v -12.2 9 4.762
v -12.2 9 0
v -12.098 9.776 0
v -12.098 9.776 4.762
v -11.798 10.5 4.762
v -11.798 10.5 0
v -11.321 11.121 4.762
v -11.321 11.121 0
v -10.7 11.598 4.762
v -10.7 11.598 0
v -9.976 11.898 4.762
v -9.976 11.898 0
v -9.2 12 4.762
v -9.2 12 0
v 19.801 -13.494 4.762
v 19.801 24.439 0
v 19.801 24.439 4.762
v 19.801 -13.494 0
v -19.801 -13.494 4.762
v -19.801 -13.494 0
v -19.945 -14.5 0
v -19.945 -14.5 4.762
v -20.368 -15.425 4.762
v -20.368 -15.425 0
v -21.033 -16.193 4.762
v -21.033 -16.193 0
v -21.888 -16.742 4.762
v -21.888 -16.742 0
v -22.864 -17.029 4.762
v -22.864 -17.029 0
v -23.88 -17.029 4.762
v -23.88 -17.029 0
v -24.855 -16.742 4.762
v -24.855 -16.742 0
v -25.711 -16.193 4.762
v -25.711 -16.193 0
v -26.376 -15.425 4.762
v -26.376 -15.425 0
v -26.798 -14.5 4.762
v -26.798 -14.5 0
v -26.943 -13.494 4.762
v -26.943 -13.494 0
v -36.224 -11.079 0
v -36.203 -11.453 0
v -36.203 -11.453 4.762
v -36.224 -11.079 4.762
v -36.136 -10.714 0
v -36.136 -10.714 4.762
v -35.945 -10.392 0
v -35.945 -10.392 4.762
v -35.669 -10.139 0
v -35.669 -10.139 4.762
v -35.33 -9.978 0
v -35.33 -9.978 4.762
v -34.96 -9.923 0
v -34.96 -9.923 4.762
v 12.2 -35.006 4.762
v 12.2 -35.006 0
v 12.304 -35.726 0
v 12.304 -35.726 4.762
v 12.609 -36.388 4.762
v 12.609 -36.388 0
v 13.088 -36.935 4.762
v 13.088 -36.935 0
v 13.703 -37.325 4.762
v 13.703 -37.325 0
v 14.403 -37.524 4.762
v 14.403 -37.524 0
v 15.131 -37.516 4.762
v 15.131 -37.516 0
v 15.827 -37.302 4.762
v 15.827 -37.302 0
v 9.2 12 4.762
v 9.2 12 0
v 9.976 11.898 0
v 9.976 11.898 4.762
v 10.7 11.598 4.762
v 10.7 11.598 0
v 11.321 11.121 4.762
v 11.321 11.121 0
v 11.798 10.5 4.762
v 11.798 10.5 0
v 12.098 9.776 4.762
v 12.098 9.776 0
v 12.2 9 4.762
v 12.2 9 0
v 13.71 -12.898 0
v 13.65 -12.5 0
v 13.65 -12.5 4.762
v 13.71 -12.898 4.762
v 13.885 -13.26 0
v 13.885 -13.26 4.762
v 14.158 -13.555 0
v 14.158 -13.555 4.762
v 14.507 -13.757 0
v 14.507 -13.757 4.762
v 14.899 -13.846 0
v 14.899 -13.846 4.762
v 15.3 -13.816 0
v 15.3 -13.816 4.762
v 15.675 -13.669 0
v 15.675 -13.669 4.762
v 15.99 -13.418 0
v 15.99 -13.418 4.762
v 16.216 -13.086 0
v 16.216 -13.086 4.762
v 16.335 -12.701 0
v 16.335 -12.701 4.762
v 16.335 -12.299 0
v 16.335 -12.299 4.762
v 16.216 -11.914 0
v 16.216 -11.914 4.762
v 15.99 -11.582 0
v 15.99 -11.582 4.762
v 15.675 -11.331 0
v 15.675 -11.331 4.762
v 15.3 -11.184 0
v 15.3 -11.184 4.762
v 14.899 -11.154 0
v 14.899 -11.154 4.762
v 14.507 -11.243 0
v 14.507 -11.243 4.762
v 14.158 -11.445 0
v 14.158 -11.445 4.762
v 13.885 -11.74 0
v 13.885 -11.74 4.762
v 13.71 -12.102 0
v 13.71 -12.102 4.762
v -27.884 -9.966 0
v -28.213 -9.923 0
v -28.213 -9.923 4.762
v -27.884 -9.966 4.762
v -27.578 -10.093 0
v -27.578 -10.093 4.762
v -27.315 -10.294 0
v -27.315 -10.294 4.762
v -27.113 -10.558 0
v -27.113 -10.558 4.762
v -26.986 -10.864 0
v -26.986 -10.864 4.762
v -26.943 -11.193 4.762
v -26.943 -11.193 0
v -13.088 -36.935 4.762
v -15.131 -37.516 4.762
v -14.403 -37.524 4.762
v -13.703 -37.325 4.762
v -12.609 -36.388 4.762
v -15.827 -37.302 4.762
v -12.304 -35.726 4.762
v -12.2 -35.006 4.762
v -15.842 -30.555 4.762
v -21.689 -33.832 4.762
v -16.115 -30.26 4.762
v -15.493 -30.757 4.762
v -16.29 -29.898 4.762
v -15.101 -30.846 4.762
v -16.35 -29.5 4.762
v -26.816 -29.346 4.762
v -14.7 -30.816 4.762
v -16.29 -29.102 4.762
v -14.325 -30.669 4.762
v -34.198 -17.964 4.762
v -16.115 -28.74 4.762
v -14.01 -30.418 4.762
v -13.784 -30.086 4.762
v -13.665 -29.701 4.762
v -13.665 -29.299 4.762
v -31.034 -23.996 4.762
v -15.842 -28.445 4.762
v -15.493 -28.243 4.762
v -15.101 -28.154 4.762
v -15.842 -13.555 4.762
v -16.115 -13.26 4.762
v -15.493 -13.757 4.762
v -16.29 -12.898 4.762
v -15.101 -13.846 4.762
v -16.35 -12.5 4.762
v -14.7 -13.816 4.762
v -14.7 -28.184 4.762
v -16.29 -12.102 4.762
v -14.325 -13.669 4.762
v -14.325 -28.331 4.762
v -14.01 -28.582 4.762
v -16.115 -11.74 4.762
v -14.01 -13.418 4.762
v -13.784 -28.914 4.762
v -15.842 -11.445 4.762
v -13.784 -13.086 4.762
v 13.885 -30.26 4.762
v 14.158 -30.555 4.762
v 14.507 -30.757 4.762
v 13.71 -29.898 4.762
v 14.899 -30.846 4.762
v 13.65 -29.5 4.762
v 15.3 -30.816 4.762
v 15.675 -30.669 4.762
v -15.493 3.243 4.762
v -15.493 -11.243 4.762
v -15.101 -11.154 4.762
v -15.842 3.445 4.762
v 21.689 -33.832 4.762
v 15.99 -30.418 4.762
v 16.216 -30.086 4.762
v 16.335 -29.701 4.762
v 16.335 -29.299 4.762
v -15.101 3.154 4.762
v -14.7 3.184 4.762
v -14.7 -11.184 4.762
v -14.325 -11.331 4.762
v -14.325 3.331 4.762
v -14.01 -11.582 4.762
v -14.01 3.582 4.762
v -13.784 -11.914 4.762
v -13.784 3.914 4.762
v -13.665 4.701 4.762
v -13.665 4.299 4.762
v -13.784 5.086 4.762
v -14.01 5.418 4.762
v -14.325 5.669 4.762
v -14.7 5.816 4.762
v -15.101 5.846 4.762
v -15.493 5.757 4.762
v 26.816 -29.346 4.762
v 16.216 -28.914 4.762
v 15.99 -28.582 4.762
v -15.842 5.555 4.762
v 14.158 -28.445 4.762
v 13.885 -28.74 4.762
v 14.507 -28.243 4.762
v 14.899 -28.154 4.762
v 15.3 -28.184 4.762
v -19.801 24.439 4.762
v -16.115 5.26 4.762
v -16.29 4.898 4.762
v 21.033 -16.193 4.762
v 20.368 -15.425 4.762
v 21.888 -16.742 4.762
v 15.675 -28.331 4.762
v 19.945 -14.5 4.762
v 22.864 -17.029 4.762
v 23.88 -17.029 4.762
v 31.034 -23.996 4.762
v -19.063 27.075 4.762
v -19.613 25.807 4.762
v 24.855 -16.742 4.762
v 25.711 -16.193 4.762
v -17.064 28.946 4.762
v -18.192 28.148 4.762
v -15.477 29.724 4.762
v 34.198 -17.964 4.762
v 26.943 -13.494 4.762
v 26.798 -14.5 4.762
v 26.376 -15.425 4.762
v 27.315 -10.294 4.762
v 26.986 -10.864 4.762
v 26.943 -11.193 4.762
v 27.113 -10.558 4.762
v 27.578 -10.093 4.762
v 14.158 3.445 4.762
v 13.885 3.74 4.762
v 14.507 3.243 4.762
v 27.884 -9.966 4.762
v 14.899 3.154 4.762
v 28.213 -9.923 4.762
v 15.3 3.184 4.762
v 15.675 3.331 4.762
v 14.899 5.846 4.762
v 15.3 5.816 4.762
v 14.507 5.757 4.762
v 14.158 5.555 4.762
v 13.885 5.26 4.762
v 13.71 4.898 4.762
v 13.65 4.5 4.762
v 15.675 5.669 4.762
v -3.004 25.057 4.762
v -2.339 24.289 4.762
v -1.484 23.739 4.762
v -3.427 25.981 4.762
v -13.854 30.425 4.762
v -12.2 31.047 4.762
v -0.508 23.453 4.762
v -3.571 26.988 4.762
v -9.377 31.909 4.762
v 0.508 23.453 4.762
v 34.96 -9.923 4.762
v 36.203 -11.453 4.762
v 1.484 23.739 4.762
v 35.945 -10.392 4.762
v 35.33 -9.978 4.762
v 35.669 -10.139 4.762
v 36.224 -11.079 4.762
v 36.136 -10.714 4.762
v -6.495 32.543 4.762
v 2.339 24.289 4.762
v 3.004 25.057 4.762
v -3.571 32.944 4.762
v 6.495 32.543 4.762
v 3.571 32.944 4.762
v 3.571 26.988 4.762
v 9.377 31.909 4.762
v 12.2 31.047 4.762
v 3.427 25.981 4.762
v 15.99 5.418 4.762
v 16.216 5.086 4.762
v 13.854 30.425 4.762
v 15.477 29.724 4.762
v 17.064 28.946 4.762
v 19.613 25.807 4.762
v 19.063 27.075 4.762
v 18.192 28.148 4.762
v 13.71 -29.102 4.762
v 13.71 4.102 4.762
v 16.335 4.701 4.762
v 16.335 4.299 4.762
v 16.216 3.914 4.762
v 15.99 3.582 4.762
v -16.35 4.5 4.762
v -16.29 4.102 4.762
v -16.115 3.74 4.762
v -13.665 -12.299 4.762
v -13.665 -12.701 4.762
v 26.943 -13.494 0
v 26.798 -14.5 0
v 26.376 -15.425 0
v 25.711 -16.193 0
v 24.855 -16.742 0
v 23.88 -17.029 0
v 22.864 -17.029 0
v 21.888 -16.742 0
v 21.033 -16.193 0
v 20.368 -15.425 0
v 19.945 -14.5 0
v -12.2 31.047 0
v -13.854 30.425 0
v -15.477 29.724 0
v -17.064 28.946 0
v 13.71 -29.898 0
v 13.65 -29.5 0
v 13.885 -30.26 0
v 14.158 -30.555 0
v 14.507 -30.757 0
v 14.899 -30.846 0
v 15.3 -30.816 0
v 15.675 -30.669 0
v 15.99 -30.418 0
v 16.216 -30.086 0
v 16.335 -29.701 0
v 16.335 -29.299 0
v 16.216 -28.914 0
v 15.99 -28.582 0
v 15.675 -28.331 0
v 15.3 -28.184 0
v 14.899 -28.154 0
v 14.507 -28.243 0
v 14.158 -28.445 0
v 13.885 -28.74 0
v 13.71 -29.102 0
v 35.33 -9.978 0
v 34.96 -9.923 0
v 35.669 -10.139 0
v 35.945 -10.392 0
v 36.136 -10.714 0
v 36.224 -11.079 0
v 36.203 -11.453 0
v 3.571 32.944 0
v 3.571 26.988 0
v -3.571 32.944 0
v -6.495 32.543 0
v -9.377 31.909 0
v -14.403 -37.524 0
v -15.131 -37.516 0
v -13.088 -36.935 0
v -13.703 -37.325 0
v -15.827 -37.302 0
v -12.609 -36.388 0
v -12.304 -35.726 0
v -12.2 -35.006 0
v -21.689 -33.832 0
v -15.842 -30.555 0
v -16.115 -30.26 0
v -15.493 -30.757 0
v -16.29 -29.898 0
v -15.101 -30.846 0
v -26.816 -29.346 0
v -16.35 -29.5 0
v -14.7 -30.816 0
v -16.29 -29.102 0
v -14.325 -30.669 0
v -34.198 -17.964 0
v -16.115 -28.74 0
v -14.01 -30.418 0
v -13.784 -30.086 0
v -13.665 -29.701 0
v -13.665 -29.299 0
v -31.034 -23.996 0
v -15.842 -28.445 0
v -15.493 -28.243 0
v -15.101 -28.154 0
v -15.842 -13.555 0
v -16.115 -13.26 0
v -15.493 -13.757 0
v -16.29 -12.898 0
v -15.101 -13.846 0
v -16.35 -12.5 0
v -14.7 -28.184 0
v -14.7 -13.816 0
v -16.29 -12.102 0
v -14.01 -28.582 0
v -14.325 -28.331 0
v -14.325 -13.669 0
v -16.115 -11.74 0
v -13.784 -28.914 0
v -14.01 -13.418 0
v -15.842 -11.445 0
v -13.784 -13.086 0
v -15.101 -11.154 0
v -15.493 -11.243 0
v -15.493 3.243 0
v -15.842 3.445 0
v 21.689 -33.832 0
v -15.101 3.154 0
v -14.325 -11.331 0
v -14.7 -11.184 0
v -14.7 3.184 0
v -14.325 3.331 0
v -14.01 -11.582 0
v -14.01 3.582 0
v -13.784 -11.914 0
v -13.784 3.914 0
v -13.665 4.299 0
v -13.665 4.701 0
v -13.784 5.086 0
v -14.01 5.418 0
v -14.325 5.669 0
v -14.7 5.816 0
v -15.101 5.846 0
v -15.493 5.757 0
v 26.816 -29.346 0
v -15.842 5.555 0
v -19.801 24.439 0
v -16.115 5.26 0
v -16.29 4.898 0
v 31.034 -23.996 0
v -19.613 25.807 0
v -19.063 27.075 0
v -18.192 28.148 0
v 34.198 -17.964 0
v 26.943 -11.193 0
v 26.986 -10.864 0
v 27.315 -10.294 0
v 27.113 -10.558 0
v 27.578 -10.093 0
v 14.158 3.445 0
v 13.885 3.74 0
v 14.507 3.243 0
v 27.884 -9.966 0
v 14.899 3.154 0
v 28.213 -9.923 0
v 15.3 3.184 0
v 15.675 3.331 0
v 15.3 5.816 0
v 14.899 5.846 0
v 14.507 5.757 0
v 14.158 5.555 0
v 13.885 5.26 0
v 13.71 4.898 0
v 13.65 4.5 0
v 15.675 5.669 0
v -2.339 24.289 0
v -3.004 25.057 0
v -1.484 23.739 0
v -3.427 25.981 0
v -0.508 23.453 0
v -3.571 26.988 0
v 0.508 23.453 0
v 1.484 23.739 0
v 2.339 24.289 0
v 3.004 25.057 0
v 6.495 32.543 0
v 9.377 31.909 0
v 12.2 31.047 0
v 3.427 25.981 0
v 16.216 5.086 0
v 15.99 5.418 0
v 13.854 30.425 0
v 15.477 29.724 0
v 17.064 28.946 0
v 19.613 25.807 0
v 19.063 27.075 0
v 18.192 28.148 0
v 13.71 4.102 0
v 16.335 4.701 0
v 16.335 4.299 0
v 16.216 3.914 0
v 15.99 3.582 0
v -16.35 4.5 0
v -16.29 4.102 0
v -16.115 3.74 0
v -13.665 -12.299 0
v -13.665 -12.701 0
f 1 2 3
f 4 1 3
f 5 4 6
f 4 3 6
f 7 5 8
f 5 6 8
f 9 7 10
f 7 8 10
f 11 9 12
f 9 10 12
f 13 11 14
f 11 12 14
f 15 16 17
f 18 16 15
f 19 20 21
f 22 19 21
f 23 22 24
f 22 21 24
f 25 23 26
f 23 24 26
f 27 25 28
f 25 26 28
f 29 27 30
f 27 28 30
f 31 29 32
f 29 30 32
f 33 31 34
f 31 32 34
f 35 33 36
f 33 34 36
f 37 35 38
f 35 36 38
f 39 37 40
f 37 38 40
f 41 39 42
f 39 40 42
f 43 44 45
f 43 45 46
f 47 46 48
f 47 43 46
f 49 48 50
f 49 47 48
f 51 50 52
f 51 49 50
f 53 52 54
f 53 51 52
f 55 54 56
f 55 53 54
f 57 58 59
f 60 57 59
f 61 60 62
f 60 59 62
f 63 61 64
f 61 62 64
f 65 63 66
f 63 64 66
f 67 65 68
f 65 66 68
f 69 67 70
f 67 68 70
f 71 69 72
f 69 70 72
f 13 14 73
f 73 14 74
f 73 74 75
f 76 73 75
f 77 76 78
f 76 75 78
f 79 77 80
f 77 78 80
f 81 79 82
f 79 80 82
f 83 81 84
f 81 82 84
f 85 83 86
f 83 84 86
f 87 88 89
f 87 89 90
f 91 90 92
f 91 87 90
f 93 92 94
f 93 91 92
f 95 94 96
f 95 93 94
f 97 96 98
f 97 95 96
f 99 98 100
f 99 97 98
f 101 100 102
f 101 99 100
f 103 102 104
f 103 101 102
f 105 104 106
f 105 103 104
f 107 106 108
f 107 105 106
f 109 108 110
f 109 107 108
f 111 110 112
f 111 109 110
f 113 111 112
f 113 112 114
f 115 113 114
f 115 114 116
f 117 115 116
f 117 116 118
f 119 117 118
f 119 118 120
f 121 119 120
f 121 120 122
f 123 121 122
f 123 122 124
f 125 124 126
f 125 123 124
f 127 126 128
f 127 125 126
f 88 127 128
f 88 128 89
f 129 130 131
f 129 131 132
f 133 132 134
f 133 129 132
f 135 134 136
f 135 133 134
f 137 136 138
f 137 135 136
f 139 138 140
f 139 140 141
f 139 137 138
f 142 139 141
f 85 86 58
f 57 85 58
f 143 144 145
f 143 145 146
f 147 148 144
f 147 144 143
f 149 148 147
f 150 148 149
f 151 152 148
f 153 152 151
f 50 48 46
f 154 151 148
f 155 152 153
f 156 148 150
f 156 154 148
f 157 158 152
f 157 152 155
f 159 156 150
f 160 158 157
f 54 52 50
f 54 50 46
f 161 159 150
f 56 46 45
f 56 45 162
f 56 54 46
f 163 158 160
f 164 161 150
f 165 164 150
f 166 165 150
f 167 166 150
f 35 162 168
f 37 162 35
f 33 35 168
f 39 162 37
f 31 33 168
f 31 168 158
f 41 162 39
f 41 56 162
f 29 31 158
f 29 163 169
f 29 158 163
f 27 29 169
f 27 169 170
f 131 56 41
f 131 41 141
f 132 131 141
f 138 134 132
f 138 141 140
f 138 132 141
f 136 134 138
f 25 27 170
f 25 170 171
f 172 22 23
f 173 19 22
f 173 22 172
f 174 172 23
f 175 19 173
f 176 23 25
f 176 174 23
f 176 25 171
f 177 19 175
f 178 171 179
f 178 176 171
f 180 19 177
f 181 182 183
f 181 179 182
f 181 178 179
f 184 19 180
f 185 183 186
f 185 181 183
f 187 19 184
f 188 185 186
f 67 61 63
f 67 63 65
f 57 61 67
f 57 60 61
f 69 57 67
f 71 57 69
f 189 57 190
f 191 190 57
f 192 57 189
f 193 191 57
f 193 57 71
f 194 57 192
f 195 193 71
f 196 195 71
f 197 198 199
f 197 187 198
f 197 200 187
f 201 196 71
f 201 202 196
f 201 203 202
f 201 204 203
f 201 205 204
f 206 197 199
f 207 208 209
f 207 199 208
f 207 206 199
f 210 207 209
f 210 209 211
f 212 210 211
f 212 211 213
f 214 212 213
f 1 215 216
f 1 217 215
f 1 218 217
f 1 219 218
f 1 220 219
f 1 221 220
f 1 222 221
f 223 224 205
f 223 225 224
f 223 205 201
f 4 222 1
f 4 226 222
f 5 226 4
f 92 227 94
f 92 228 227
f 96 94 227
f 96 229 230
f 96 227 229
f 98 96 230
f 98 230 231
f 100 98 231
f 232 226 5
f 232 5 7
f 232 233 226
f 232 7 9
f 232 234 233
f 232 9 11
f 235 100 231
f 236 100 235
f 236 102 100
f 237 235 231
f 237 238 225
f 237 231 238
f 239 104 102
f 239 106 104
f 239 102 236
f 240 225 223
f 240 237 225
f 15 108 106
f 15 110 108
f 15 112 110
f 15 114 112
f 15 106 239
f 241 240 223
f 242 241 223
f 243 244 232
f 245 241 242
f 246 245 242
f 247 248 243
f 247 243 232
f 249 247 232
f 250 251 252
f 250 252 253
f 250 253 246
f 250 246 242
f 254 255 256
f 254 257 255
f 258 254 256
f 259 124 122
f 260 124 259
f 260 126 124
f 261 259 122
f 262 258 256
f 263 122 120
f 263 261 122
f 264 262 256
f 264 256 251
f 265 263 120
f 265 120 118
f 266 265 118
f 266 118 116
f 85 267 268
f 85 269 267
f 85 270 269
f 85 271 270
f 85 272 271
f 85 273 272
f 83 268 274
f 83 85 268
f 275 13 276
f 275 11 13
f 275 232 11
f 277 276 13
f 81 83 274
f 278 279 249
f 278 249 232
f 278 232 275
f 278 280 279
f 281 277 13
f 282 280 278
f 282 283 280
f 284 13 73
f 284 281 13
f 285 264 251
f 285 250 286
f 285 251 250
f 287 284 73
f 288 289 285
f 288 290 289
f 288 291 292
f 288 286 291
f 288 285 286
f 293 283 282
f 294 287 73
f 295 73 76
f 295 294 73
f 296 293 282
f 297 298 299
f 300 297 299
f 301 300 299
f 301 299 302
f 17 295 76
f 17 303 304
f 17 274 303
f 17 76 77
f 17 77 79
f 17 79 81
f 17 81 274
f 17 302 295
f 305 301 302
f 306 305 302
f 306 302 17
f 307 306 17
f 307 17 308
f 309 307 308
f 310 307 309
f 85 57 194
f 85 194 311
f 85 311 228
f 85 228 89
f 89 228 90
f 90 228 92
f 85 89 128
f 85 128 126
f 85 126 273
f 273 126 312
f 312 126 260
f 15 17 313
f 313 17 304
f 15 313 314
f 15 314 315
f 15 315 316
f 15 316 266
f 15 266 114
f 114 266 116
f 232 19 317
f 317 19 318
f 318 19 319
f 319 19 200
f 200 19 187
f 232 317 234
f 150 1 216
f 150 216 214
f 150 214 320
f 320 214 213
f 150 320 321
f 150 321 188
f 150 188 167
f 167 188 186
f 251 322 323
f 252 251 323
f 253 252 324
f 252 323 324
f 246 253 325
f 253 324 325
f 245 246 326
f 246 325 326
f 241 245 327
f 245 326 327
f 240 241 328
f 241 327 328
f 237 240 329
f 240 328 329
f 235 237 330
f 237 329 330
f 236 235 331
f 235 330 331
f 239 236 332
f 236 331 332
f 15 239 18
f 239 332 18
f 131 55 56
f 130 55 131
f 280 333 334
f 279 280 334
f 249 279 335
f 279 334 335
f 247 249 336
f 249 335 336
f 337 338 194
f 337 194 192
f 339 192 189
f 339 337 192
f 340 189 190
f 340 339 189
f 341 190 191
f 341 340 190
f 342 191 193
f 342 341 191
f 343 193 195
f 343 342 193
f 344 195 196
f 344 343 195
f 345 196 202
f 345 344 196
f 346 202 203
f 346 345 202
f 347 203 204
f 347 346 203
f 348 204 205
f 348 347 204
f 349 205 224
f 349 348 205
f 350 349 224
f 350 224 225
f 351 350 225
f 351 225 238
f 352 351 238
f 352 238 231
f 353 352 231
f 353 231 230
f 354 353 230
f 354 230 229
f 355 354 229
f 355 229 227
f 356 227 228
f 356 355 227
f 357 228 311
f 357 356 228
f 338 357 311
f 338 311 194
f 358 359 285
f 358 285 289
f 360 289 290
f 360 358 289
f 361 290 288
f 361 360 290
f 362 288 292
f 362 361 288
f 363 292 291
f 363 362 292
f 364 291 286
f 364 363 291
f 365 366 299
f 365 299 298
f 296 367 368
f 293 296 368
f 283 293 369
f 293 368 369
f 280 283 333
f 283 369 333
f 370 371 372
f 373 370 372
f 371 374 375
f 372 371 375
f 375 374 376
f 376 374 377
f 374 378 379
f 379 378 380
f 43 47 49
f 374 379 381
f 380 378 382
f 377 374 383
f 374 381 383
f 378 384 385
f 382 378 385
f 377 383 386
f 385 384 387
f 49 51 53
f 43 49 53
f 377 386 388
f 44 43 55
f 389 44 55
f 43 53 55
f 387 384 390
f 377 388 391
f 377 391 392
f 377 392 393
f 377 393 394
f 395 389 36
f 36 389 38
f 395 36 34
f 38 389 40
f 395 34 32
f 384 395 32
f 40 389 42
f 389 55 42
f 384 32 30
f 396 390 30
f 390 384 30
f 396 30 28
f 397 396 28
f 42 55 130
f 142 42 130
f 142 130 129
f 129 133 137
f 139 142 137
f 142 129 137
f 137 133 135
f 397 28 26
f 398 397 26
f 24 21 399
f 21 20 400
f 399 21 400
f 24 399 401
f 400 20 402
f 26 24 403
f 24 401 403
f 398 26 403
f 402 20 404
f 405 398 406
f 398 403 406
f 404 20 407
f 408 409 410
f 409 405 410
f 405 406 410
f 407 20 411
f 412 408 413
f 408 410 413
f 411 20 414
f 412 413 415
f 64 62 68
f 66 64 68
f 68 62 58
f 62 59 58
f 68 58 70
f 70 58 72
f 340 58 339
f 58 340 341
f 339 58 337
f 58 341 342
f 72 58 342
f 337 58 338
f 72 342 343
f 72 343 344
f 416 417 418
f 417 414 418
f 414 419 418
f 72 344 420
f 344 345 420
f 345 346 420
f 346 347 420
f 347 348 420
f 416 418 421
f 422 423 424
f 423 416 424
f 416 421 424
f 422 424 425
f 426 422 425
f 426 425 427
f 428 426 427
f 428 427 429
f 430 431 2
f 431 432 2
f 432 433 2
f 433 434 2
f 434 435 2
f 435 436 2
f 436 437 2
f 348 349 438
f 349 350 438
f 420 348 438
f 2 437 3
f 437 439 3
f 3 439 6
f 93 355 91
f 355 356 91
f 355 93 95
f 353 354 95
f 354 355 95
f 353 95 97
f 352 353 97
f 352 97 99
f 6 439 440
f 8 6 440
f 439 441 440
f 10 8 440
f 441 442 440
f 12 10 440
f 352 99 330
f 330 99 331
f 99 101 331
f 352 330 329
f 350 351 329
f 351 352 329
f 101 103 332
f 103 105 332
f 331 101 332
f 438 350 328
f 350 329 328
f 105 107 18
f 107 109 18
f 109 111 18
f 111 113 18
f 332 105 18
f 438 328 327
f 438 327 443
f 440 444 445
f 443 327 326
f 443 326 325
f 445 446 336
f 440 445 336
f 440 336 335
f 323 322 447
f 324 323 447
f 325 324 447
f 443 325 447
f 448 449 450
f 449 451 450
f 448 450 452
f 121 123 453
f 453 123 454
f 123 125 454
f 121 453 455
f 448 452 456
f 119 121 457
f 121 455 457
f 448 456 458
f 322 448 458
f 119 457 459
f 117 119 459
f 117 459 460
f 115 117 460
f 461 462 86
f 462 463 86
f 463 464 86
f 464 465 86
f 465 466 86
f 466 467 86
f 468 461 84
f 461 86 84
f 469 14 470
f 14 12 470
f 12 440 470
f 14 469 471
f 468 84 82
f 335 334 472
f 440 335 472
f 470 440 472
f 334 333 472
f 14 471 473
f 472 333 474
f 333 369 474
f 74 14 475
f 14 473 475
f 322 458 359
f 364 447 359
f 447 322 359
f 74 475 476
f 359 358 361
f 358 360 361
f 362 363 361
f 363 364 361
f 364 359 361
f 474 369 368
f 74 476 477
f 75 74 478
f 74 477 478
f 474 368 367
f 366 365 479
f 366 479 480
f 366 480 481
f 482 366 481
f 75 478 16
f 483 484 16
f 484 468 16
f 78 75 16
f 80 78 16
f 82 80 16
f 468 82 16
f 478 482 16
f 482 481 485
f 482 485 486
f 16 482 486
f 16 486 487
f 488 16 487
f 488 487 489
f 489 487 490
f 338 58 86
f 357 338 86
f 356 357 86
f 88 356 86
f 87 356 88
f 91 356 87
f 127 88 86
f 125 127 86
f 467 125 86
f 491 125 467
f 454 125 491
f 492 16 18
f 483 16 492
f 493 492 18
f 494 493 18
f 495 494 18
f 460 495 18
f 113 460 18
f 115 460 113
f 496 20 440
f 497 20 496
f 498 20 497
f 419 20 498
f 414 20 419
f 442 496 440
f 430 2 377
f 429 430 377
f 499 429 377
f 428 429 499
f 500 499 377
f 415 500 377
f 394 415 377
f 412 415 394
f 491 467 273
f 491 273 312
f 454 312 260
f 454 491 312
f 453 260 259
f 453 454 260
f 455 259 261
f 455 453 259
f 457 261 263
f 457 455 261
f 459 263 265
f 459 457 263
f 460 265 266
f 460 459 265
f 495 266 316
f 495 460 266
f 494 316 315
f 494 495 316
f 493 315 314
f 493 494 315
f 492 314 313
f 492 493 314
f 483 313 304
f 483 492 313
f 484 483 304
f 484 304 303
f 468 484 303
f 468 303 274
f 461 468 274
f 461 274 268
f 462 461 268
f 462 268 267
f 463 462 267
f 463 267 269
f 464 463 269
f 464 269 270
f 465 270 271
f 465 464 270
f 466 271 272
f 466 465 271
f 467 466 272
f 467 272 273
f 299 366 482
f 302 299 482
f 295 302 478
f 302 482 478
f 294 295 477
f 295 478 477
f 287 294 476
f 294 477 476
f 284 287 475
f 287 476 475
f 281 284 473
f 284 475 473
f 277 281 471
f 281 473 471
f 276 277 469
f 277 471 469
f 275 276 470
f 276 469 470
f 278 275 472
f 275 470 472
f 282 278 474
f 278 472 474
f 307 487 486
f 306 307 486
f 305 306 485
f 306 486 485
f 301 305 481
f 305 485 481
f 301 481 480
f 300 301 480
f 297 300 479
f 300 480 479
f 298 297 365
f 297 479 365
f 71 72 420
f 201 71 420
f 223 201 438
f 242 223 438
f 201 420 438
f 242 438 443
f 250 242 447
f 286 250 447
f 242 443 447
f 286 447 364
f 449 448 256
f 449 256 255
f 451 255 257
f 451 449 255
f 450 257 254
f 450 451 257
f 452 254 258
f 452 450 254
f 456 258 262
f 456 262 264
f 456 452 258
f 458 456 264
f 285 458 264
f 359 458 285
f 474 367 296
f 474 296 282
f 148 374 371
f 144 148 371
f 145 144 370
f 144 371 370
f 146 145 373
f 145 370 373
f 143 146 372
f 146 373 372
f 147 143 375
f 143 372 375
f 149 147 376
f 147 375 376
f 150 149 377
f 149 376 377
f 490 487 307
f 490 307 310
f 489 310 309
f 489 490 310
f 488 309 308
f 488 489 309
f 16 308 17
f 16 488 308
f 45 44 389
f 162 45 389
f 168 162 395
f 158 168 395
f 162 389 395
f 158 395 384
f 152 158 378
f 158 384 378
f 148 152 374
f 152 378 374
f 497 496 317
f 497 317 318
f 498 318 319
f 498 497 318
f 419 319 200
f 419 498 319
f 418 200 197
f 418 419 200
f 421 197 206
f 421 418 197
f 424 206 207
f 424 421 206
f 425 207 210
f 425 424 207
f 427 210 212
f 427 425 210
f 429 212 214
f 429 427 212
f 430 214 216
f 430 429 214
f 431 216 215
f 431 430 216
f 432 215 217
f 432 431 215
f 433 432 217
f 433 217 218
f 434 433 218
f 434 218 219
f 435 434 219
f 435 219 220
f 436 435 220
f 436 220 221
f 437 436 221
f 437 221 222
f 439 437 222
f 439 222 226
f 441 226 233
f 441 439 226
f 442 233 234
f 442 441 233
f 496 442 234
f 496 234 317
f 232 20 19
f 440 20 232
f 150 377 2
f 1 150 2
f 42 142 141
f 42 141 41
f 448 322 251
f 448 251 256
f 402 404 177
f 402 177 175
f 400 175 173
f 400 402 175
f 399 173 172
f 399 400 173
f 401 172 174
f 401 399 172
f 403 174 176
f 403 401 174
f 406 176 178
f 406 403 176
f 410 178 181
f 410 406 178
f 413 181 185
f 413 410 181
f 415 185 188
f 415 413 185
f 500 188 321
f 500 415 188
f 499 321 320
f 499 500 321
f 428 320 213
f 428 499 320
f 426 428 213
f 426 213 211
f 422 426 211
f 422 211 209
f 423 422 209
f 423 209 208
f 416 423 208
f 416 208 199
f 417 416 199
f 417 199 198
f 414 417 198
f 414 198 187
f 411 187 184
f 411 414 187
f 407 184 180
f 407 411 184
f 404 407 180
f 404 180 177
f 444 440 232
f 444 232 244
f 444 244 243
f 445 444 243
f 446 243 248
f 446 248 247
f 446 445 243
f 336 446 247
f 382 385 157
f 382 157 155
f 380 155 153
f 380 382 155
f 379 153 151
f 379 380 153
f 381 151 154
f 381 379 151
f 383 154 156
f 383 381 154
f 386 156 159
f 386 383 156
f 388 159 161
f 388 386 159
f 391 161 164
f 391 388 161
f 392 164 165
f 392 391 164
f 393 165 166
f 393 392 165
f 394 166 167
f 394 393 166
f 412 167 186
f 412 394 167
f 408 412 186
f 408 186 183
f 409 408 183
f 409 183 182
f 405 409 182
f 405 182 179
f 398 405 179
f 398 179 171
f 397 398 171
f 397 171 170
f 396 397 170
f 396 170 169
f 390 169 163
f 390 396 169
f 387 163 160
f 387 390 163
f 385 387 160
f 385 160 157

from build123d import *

# Parameters (mm, degrees)
SKETCH2_R                   = 1.35
BOSS_EXTRUDE1_DEPTH         = 4.7625
F_1_4_CLEARANCE_HOLE1_D     = 7.14248
F_1_4_CLEARANCE_HOLE1_DEPTH = 6.35
F_1_4_CLEARANCE_HOLE1_TIP   = 2.145817477
CUT_EXTRUDE1_START          = -4.7625
CUT_EXTRUDE1_DEPTH          = 4.7625


with BuildPart() as part:
    # Sketch2 → Boss-Extrude1 (new body)
    with BuildSketch(Plane.XY):
        with BuildLine():
            Line((-9.2, 12), (9.2, 12))
            ThreePointArc((9.2, 12), (11.321320344, 11.121320344), (12.2, 9))
            Line((12.2, 9), (12.2, -30))
            Line((12.2, -30), (12.2, -35.006033217))
            ThreePointArc((12.2, -35.006033217), (13.381504408, -37.152213482), (15.826842305, -37.301762688))
            ThreePointArc((15.826842305, -37.301762688), (36.936087169, -1.910874265), (12.2, 31.047299132))
            ThreePointArc((12.2, 31.047299132), (0, 33.117218452), (-12.2, 31.047299132))
            ThreePointArc((-12.2, 31.047299132), (-36.936087169, -1.910874265), (-15.826842305, -37.301762688))
            ThreePointArc((-15.826842305, -37.301762688), (-13.381504408, -37.152213482), (-12.2, -35.006033217))
            Line((-12.2, -35.006033217), (-12.2, -30))
            Line((-12.2, -30), (-12.2, 9))
            ThreePointArc((-12.2, 9), (-11.321320344, 11.121320344), (-9.2, 12))
        make_face()
        with Locations(Location((-15, -12.5, 0), (0, 0, 180))):
            Circle(SKETCH2_R, mode=Mode.SUBTRACT)
        with Locations(Location((-15, 4.5, 0), (0, 0, 180))):
            Circle(SKETCH2_R, mode=Mode.SUBTRACT)
        with Locations(Location((-15, -29.5, 0), (0, 0, 180))):
            Circle(SKETCH2_R, mode=Mode.SUBTRACT)
        with Locations(Location((15, -29.5, 0), (0, 0, 180))):
            Circle(SKETCH2_R, mode=Mode.SUBTRACT)
        with Locations(Location((15, -12.5, 0), (0, 0, 180))):
            Circle(SKETCH2_R, mode=Mode.SUBTRACT)
        with Locations(Location((15, 4.5, 0), (0, 0, 180))):
            Circle(SKETCH2_R, mode=Mode.SUBTRACT)
    extrude(amount=BOSS_EXTRUDE1_DEPTH)

    # 1/4 Clearance Hole1
    with Locations(Plane.XY.offset(4.7625)):
        with Locations((-23.371860585, -13.49375), (23.371860585, -13.49375), (0, 26.9875)):
            Hole(F_1_4_CLEARANCE_HOLE1_D / 2, depth=F_1_4_CLEARANCE_HOLE1_DEPTH)
            with Locations((0, 0, -(F_1_4_CLEARANCE_HOLE1_DEPTH + F_1_4_CLEARANCE_HOLE1_TIP / 2))):  # 118° drill point
                Cone(0, F_1_4_CLEARANCE_HOLE1_D / 2, F_1_4_CLEARANCE_HOLE1_TIP, mode=Mode.SUBTRACT)

    # Sketch5 → Cut-Extrude1 (cut)
    with BuildSketch(Plane.XY.offset(4.7625).offset(CUT_EXTRUDE1_START)):
        with BuildLine():
            ThreePointArc((19.800620585, 27.370987986), (18.449246292, 28.187570965), (17.064253254, 28.945736198))
            ThreePointArc((17.064253254, 28.945736198), (19.062973286, 27.075010458), (19.800620585, 24.438654446))
            Line((19.800620585, 24.438654446), (19.800620585, -13.49375))
            ThreePointArc((19.800620585, -13.49375), (23.371860585, -9.92251), (26.943100585, -13.49375))
            Line((26.943100585, -13.49375), (26.943100585, -11.19251))
            ThreePointArc((26.943100585, -11.19251), (27.315074973, -10.294484388), (28.213100585, -9.92251))
            Line((28.213100585, -9.92251), (34.959580577, -9.92251))
            ThreePointArc((34.959580577, -9.92251), (35.94535967, -10.391798079), (36.202612185, -11.45284137))
            ThreePointArc((36.202612185, -11.45284137), (36.354175005, -10.689186113), (36.48963119, -9.92251))
            ThreePointArc((36.48963119, -9.92251), (33.761655161, 11.237661484), (19.800620585, 27.370987986))
        make_face()
        with BuildLine():
            ThreePointArc((-3.57124, 26.9875), (0, 30.55874), (3.57124, 26.9875))
            Line((3.57124, 26.9875), (3.57124, 32.94441106))
            ThreePointArc((3.57124, 32.94441106), (0, 33.117218452), (-3.57124, 32.94441106))
            Line((-3.57124, 32.94441106), (-3.57124, 26.9875))
        make_face()
        with BuildLine():
            ThreePointArc((-19.800620585, 24.438654446), (-19.062973286, 27.075010458), (-17.064253254, 28.945736198))
            ThreePointArc((-17.064253254, 28.945736198), (-18.449246292, 28.187570965), (-19.800620585, 27.370987986))
            ThreePointArc((-19.800620585, 27.370987986), (-33.761655161, 11.237661484), (-36.48963119, -9.92251))
            ThreePointArc((-36.48963119, -9.92251), (-36.354175005, -10.689186113), (-36.202612185, -11.45284137))
            ThreePointArc((-36.202612185, -11.45284137), (-35.94535967, -10.391798079), (-34.959580577, -9.92251))
            Line((-34.959580577, -9.92251), (-28.213100585, -9.92251))
            ThreePointArc((-28.213100585, -9.92251), (-27.315074973, -10.294484388), (-26.943100585, -11.19251))
            Line((-26.943100585, -11.19251), (-26.943100585, -13.49375))
            ThreePointArc((-26.943100585, -13.49375), (-23.371860585, -9.92251), (-19.800620585, -13.49375))
            Line((-19.800620585, -13.49375), (-19.800620585, 24.438654446))
        make_face()
    extrude(amount=CUT_EXTRUDE1_DEPTH, mode=Mode.SUBTRACT)


solid = part.part
